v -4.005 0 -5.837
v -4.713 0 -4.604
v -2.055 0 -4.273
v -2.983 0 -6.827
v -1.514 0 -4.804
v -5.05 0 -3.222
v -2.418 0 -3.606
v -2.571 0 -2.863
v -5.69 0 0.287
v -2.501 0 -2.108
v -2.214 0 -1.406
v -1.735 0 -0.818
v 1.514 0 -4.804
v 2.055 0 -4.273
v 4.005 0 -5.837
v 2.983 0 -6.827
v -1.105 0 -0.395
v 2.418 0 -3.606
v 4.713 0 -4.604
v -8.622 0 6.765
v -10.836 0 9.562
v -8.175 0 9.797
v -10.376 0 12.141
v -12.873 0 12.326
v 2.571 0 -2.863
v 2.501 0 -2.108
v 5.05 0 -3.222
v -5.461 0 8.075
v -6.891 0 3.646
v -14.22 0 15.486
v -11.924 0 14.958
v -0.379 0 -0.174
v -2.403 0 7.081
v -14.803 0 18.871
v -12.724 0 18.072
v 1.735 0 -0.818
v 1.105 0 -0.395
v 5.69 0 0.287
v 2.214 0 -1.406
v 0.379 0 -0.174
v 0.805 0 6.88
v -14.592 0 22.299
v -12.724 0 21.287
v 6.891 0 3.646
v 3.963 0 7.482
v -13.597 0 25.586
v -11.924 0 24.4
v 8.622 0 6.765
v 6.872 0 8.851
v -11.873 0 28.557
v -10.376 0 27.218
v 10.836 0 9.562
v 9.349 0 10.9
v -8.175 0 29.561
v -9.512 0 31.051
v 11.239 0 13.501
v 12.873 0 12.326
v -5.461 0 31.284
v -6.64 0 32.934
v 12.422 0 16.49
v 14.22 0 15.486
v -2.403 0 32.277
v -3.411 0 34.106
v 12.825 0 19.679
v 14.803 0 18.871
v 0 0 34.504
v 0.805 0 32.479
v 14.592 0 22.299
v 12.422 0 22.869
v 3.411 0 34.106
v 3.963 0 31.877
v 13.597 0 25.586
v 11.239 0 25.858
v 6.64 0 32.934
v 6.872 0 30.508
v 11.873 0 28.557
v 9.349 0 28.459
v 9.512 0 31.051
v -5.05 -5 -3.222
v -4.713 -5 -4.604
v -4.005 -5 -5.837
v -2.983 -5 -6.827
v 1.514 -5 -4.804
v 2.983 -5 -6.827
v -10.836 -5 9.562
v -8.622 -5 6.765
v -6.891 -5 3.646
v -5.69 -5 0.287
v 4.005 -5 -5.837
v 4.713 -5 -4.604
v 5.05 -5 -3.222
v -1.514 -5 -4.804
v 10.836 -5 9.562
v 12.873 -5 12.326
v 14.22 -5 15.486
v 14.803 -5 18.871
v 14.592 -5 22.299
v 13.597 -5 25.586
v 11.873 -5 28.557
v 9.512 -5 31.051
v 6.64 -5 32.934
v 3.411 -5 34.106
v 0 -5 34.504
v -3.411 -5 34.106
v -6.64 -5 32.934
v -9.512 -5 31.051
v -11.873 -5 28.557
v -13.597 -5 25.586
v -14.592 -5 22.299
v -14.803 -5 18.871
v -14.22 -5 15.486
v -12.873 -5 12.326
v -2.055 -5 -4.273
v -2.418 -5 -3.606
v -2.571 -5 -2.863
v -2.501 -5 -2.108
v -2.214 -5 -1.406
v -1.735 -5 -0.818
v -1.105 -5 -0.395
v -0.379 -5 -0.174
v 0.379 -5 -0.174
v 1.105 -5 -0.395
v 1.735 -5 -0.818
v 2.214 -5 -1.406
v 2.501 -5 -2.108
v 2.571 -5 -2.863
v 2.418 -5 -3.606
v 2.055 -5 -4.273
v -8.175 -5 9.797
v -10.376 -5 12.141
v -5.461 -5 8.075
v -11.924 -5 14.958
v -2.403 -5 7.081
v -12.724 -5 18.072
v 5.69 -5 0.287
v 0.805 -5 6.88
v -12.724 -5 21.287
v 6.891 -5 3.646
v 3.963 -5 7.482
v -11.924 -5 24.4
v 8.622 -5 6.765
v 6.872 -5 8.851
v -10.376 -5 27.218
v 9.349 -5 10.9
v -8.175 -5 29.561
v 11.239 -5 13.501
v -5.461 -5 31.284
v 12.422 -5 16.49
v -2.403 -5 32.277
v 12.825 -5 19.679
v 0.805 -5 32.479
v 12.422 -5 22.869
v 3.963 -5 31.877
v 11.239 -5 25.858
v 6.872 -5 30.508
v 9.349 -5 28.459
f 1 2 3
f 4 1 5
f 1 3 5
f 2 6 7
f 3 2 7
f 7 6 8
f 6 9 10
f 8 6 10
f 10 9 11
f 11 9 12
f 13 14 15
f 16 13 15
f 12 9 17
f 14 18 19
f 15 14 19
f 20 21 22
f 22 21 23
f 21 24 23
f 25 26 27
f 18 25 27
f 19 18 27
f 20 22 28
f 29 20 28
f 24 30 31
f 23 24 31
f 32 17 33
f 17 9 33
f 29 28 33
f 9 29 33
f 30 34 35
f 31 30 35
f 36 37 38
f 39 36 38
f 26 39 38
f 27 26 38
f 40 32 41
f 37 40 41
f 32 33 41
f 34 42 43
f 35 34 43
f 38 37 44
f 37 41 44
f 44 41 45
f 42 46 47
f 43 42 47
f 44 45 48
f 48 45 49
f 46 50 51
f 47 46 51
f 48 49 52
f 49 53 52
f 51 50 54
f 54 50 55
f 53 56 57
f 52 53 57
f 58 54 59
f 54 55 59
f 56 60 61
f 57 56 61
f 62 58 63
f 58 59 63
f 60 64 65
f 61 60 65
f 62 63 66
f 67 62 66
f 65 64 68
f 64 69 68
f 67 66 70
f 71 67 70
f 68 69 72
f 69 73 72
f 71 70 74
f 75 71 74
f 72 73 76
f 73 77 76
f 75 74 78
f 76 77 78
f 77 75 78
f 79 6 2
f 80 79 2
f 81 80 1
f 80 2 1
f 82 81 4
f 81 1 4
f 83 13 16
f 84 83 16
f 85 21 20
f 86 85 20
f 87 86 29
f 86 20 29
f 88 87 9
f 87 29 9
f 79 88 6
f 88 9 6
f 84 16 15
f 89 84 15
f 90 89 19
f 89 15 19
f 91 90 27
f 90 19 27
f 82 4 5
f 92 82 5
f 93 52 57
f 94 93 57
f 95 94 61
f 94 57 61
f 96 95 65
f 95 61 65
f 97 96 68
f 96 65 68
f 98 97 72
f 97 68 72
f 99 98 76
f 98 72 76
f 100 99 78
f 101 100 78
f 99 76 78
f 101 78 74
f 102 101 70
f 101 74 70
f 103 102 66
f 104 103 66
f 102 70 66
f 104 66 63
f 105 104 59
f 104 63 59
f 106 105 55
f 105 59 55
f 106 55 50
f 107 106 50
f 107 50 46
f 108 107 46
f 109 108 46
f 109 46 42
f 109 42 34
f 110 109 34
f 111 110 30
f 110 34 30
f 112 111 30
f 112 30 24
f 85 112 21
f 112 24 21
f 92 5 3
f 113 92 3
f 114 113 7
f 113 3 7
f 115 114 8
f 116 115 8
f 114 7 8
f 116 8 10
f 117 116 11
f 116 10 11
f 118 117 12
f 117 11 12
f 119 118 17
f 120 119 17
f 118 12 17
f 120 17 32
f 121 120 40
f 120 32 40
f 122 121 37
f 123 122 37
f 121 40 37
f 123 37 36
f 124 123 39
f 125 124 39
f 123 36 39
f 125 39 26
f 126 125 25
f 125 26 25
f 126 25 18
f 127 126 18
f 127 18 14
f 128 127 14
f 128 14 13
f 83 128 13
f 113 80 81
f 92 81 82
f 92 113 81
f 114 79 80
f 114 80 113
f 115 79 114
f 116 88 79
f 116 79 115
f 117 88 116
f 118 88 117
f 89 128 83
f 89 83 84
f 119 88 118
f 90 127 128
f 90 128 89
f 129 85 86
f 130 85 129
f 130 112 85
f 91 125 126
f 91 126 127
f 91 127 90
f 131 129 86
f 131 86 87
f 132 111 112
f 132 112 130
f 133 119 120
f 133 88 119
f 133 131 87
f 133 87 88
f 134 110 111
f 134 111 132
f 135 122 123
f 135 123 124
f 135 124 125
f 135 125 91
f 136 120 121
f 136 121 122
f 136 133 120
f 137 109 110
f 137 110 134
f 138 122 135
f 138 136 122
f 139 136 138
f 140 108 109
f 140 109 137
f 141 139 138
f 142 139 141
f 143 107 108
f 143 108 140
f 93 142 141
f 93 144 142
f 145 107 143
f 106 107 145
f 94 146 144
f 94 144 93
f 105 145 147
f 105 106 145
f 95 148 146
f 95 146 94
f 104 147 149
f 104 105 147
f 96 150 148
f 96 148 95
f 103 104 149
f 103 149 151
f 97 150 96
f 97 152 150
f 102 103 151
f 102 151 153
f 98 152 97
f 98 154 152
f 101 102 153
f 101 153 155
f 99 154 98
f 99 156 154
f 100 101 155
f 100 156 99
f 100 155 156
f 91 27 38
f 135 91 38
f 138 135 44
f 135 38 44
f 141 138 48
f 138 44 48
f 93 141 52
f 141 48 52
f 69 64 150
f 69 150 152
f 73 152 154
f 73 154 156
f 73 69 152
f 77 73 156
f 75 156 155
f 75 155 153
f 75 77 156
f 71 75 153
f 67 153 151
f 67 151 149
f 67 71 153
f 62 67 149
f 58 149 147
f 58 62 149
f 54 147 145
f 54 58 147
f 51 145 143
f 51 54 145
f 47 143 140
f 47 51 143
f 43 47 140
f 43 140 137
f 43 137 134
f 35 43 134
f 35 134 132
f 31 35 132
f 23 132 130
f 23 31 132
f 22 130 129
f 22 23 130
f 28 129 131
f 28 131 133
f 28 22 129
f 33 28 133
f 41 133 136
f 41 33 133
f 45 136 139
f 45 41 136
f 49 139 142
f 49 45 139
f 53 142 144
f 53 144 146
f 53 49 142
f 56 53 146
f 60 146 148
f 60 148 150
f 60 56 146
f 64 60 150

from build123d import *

# Parameters (mm, degrees)
F0_R     = 12.825
F1_DEPTH = 5


with BuildPart() as f1:
    # F0 (on Front) → F1 (new body)
    with BuildSketch(Plane.XZ):
        with BuildLine():
            ThreePointArc((-1.513547, -4.804002), (0, -0.145783), (1.513547, -4.804002))
            Line((1.513547, -4.804002), (2.98301, -6.826544))
            ThreePointArc((2.98301, -6.826544), (4.402496, -5.245392), (5.050221, -3.221673))
            ThreePointArc((5.050221, -3.221673), (6.891336, 3.645865), (10.835703, 9.561502))
            ThreePointArc((10.835703, 9.561502), (0, 34.504217), (-10.835703, 9.561502))
            ThreePointArc((-10.835703, 9.561502), (-6.891336, 3.645865), (-5.050221, -3.221673))
            ThreePointArc((-5.050221, -3.221673), (-4.402496, -5.245392), (-2.98301, -6.826544))
            Line((-2.98301, -6.826544), (-1.513547, -4.804002))
        make_face()
        with Locations((0, 19.679217)):
            Circle(F0_R, mode=Mode.SUBTRACT)
    extrude(amount=F1_DEPTH)


solid = f1.part
